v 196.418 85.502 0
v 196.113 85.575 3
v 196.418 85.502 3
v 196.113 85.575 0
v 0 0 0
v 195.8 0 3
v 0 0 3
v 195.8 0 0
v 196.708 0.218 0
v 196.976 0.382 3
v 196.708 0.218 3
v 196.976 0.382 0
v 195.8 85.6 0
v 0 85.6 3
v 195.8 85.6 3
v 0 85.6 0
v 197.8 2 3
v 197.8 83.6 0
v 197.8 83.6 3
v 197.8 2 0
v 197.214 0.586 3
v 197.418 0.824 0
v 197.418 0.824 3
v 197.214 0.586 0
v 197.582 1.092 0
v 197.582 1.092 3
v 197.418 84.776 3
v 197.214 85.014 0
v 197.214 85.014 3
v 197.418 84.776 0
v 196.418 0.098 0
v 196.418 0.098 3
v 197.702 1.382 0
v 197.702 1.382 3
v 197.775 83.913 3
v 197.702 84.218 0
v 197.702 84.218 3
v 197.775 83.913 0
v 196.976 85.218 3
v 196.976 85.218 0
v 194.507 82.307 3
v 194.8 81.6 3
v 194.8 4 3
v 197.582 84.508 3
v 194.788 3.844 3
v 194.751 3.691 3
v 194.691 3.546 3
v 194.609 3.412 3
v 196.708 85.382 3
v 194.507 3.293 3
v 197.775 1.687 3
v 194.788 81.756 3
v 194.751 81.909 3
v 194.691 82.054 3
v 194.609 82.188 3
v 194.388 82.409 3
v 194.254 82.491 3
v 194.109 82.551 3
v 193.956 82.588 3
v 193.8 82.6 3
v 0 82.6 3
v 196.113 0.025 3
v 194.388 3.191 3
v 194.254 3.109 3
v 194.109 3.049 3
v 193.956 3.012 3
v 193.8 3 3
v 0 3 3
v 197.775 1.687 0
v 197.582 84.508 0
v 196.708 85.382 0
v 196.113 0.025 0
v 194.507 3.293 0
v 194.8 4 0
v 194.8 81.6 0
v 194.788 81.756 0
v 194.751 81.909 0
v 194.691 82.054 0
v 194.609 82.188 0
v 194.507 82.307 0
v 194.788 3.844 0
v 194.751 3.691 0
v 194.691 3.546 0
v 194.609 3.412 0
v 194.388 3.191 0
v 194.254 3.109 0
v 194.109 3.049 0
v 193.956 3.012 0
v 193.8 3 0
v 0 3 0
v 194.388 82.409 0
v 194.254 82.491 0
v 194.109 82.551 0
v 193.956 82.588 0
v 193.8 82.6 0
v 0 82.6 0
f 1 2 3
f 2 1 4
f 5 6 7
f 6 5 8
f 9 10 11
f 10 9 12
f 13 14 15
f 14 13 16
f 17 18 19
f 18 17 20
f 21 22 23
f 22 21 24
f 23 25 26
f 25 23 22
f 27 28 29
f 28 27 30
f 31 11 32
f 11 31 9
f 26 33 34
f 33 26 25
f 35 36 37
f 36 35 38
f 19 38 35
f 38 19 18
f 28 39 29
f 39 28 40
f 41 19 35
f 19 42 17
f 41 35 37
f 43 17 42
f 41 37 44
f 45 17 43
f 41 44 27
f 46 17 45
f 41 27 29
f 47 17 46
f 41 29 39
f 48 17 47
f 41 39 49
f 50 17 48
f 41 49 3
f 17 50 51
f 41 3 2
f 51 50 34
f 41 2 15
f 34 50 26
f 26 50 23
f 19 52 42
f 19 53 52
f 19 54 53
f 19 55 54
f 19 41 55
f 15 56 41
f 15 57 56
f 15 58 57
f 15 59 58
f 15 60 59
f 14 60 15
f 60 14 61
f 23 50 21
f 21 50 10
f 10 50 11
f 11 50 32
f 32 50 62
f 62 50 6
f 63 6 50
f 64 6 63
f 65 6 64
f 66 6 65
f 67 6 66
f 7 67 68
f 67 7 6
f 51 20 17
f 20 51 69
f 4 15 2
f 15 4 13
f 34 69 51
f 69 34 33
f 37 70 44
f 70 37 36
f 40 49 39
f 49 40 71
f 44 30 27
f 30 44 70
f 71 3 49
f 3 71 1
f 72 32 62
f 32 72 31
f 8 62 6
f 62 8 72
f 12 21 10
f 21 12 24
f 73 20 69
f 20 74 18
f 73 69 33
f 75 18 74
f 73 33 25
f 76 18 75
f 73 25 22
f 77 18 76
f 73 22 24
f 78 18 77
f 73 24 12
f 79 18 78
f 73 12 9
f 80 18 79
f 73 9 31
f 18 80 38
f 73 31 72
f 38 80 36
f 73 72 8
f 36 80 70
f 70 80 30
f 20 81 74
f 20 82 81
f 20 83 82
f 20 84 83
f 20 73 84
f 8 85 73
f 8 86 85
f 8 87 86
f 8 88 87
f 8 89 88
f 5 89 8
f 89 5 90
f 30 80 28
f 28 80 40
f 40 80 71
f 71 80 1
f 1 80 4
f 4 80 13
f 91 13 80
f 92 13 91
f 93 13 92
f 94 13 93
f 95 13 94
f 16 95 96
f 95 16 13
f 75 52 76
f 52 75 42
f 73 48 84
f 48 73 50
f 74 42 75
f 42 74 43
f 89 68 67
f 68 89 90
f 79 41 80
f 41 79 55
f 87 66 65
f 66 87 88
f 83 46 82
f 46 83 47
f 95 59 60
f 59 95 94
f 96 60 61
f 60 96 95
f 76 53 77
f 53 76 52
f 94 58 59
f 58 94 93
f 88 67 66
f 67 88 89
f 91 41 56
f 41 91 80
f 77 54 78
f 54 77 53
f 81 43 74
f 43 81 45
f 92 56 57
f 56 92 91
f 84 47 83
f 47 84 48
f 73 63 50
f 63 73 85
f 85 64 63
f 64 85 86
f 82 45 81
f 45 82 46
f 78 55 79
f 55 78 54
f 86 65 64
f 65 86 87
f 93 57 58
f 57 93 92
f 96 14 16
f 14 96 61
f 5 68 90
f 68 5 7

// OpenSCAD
include <protective_storage_box.scad>
lid_angle = 0;
show_tray_in_assembly = false;
render_assembly = false;
lid_weave_frame_right();
